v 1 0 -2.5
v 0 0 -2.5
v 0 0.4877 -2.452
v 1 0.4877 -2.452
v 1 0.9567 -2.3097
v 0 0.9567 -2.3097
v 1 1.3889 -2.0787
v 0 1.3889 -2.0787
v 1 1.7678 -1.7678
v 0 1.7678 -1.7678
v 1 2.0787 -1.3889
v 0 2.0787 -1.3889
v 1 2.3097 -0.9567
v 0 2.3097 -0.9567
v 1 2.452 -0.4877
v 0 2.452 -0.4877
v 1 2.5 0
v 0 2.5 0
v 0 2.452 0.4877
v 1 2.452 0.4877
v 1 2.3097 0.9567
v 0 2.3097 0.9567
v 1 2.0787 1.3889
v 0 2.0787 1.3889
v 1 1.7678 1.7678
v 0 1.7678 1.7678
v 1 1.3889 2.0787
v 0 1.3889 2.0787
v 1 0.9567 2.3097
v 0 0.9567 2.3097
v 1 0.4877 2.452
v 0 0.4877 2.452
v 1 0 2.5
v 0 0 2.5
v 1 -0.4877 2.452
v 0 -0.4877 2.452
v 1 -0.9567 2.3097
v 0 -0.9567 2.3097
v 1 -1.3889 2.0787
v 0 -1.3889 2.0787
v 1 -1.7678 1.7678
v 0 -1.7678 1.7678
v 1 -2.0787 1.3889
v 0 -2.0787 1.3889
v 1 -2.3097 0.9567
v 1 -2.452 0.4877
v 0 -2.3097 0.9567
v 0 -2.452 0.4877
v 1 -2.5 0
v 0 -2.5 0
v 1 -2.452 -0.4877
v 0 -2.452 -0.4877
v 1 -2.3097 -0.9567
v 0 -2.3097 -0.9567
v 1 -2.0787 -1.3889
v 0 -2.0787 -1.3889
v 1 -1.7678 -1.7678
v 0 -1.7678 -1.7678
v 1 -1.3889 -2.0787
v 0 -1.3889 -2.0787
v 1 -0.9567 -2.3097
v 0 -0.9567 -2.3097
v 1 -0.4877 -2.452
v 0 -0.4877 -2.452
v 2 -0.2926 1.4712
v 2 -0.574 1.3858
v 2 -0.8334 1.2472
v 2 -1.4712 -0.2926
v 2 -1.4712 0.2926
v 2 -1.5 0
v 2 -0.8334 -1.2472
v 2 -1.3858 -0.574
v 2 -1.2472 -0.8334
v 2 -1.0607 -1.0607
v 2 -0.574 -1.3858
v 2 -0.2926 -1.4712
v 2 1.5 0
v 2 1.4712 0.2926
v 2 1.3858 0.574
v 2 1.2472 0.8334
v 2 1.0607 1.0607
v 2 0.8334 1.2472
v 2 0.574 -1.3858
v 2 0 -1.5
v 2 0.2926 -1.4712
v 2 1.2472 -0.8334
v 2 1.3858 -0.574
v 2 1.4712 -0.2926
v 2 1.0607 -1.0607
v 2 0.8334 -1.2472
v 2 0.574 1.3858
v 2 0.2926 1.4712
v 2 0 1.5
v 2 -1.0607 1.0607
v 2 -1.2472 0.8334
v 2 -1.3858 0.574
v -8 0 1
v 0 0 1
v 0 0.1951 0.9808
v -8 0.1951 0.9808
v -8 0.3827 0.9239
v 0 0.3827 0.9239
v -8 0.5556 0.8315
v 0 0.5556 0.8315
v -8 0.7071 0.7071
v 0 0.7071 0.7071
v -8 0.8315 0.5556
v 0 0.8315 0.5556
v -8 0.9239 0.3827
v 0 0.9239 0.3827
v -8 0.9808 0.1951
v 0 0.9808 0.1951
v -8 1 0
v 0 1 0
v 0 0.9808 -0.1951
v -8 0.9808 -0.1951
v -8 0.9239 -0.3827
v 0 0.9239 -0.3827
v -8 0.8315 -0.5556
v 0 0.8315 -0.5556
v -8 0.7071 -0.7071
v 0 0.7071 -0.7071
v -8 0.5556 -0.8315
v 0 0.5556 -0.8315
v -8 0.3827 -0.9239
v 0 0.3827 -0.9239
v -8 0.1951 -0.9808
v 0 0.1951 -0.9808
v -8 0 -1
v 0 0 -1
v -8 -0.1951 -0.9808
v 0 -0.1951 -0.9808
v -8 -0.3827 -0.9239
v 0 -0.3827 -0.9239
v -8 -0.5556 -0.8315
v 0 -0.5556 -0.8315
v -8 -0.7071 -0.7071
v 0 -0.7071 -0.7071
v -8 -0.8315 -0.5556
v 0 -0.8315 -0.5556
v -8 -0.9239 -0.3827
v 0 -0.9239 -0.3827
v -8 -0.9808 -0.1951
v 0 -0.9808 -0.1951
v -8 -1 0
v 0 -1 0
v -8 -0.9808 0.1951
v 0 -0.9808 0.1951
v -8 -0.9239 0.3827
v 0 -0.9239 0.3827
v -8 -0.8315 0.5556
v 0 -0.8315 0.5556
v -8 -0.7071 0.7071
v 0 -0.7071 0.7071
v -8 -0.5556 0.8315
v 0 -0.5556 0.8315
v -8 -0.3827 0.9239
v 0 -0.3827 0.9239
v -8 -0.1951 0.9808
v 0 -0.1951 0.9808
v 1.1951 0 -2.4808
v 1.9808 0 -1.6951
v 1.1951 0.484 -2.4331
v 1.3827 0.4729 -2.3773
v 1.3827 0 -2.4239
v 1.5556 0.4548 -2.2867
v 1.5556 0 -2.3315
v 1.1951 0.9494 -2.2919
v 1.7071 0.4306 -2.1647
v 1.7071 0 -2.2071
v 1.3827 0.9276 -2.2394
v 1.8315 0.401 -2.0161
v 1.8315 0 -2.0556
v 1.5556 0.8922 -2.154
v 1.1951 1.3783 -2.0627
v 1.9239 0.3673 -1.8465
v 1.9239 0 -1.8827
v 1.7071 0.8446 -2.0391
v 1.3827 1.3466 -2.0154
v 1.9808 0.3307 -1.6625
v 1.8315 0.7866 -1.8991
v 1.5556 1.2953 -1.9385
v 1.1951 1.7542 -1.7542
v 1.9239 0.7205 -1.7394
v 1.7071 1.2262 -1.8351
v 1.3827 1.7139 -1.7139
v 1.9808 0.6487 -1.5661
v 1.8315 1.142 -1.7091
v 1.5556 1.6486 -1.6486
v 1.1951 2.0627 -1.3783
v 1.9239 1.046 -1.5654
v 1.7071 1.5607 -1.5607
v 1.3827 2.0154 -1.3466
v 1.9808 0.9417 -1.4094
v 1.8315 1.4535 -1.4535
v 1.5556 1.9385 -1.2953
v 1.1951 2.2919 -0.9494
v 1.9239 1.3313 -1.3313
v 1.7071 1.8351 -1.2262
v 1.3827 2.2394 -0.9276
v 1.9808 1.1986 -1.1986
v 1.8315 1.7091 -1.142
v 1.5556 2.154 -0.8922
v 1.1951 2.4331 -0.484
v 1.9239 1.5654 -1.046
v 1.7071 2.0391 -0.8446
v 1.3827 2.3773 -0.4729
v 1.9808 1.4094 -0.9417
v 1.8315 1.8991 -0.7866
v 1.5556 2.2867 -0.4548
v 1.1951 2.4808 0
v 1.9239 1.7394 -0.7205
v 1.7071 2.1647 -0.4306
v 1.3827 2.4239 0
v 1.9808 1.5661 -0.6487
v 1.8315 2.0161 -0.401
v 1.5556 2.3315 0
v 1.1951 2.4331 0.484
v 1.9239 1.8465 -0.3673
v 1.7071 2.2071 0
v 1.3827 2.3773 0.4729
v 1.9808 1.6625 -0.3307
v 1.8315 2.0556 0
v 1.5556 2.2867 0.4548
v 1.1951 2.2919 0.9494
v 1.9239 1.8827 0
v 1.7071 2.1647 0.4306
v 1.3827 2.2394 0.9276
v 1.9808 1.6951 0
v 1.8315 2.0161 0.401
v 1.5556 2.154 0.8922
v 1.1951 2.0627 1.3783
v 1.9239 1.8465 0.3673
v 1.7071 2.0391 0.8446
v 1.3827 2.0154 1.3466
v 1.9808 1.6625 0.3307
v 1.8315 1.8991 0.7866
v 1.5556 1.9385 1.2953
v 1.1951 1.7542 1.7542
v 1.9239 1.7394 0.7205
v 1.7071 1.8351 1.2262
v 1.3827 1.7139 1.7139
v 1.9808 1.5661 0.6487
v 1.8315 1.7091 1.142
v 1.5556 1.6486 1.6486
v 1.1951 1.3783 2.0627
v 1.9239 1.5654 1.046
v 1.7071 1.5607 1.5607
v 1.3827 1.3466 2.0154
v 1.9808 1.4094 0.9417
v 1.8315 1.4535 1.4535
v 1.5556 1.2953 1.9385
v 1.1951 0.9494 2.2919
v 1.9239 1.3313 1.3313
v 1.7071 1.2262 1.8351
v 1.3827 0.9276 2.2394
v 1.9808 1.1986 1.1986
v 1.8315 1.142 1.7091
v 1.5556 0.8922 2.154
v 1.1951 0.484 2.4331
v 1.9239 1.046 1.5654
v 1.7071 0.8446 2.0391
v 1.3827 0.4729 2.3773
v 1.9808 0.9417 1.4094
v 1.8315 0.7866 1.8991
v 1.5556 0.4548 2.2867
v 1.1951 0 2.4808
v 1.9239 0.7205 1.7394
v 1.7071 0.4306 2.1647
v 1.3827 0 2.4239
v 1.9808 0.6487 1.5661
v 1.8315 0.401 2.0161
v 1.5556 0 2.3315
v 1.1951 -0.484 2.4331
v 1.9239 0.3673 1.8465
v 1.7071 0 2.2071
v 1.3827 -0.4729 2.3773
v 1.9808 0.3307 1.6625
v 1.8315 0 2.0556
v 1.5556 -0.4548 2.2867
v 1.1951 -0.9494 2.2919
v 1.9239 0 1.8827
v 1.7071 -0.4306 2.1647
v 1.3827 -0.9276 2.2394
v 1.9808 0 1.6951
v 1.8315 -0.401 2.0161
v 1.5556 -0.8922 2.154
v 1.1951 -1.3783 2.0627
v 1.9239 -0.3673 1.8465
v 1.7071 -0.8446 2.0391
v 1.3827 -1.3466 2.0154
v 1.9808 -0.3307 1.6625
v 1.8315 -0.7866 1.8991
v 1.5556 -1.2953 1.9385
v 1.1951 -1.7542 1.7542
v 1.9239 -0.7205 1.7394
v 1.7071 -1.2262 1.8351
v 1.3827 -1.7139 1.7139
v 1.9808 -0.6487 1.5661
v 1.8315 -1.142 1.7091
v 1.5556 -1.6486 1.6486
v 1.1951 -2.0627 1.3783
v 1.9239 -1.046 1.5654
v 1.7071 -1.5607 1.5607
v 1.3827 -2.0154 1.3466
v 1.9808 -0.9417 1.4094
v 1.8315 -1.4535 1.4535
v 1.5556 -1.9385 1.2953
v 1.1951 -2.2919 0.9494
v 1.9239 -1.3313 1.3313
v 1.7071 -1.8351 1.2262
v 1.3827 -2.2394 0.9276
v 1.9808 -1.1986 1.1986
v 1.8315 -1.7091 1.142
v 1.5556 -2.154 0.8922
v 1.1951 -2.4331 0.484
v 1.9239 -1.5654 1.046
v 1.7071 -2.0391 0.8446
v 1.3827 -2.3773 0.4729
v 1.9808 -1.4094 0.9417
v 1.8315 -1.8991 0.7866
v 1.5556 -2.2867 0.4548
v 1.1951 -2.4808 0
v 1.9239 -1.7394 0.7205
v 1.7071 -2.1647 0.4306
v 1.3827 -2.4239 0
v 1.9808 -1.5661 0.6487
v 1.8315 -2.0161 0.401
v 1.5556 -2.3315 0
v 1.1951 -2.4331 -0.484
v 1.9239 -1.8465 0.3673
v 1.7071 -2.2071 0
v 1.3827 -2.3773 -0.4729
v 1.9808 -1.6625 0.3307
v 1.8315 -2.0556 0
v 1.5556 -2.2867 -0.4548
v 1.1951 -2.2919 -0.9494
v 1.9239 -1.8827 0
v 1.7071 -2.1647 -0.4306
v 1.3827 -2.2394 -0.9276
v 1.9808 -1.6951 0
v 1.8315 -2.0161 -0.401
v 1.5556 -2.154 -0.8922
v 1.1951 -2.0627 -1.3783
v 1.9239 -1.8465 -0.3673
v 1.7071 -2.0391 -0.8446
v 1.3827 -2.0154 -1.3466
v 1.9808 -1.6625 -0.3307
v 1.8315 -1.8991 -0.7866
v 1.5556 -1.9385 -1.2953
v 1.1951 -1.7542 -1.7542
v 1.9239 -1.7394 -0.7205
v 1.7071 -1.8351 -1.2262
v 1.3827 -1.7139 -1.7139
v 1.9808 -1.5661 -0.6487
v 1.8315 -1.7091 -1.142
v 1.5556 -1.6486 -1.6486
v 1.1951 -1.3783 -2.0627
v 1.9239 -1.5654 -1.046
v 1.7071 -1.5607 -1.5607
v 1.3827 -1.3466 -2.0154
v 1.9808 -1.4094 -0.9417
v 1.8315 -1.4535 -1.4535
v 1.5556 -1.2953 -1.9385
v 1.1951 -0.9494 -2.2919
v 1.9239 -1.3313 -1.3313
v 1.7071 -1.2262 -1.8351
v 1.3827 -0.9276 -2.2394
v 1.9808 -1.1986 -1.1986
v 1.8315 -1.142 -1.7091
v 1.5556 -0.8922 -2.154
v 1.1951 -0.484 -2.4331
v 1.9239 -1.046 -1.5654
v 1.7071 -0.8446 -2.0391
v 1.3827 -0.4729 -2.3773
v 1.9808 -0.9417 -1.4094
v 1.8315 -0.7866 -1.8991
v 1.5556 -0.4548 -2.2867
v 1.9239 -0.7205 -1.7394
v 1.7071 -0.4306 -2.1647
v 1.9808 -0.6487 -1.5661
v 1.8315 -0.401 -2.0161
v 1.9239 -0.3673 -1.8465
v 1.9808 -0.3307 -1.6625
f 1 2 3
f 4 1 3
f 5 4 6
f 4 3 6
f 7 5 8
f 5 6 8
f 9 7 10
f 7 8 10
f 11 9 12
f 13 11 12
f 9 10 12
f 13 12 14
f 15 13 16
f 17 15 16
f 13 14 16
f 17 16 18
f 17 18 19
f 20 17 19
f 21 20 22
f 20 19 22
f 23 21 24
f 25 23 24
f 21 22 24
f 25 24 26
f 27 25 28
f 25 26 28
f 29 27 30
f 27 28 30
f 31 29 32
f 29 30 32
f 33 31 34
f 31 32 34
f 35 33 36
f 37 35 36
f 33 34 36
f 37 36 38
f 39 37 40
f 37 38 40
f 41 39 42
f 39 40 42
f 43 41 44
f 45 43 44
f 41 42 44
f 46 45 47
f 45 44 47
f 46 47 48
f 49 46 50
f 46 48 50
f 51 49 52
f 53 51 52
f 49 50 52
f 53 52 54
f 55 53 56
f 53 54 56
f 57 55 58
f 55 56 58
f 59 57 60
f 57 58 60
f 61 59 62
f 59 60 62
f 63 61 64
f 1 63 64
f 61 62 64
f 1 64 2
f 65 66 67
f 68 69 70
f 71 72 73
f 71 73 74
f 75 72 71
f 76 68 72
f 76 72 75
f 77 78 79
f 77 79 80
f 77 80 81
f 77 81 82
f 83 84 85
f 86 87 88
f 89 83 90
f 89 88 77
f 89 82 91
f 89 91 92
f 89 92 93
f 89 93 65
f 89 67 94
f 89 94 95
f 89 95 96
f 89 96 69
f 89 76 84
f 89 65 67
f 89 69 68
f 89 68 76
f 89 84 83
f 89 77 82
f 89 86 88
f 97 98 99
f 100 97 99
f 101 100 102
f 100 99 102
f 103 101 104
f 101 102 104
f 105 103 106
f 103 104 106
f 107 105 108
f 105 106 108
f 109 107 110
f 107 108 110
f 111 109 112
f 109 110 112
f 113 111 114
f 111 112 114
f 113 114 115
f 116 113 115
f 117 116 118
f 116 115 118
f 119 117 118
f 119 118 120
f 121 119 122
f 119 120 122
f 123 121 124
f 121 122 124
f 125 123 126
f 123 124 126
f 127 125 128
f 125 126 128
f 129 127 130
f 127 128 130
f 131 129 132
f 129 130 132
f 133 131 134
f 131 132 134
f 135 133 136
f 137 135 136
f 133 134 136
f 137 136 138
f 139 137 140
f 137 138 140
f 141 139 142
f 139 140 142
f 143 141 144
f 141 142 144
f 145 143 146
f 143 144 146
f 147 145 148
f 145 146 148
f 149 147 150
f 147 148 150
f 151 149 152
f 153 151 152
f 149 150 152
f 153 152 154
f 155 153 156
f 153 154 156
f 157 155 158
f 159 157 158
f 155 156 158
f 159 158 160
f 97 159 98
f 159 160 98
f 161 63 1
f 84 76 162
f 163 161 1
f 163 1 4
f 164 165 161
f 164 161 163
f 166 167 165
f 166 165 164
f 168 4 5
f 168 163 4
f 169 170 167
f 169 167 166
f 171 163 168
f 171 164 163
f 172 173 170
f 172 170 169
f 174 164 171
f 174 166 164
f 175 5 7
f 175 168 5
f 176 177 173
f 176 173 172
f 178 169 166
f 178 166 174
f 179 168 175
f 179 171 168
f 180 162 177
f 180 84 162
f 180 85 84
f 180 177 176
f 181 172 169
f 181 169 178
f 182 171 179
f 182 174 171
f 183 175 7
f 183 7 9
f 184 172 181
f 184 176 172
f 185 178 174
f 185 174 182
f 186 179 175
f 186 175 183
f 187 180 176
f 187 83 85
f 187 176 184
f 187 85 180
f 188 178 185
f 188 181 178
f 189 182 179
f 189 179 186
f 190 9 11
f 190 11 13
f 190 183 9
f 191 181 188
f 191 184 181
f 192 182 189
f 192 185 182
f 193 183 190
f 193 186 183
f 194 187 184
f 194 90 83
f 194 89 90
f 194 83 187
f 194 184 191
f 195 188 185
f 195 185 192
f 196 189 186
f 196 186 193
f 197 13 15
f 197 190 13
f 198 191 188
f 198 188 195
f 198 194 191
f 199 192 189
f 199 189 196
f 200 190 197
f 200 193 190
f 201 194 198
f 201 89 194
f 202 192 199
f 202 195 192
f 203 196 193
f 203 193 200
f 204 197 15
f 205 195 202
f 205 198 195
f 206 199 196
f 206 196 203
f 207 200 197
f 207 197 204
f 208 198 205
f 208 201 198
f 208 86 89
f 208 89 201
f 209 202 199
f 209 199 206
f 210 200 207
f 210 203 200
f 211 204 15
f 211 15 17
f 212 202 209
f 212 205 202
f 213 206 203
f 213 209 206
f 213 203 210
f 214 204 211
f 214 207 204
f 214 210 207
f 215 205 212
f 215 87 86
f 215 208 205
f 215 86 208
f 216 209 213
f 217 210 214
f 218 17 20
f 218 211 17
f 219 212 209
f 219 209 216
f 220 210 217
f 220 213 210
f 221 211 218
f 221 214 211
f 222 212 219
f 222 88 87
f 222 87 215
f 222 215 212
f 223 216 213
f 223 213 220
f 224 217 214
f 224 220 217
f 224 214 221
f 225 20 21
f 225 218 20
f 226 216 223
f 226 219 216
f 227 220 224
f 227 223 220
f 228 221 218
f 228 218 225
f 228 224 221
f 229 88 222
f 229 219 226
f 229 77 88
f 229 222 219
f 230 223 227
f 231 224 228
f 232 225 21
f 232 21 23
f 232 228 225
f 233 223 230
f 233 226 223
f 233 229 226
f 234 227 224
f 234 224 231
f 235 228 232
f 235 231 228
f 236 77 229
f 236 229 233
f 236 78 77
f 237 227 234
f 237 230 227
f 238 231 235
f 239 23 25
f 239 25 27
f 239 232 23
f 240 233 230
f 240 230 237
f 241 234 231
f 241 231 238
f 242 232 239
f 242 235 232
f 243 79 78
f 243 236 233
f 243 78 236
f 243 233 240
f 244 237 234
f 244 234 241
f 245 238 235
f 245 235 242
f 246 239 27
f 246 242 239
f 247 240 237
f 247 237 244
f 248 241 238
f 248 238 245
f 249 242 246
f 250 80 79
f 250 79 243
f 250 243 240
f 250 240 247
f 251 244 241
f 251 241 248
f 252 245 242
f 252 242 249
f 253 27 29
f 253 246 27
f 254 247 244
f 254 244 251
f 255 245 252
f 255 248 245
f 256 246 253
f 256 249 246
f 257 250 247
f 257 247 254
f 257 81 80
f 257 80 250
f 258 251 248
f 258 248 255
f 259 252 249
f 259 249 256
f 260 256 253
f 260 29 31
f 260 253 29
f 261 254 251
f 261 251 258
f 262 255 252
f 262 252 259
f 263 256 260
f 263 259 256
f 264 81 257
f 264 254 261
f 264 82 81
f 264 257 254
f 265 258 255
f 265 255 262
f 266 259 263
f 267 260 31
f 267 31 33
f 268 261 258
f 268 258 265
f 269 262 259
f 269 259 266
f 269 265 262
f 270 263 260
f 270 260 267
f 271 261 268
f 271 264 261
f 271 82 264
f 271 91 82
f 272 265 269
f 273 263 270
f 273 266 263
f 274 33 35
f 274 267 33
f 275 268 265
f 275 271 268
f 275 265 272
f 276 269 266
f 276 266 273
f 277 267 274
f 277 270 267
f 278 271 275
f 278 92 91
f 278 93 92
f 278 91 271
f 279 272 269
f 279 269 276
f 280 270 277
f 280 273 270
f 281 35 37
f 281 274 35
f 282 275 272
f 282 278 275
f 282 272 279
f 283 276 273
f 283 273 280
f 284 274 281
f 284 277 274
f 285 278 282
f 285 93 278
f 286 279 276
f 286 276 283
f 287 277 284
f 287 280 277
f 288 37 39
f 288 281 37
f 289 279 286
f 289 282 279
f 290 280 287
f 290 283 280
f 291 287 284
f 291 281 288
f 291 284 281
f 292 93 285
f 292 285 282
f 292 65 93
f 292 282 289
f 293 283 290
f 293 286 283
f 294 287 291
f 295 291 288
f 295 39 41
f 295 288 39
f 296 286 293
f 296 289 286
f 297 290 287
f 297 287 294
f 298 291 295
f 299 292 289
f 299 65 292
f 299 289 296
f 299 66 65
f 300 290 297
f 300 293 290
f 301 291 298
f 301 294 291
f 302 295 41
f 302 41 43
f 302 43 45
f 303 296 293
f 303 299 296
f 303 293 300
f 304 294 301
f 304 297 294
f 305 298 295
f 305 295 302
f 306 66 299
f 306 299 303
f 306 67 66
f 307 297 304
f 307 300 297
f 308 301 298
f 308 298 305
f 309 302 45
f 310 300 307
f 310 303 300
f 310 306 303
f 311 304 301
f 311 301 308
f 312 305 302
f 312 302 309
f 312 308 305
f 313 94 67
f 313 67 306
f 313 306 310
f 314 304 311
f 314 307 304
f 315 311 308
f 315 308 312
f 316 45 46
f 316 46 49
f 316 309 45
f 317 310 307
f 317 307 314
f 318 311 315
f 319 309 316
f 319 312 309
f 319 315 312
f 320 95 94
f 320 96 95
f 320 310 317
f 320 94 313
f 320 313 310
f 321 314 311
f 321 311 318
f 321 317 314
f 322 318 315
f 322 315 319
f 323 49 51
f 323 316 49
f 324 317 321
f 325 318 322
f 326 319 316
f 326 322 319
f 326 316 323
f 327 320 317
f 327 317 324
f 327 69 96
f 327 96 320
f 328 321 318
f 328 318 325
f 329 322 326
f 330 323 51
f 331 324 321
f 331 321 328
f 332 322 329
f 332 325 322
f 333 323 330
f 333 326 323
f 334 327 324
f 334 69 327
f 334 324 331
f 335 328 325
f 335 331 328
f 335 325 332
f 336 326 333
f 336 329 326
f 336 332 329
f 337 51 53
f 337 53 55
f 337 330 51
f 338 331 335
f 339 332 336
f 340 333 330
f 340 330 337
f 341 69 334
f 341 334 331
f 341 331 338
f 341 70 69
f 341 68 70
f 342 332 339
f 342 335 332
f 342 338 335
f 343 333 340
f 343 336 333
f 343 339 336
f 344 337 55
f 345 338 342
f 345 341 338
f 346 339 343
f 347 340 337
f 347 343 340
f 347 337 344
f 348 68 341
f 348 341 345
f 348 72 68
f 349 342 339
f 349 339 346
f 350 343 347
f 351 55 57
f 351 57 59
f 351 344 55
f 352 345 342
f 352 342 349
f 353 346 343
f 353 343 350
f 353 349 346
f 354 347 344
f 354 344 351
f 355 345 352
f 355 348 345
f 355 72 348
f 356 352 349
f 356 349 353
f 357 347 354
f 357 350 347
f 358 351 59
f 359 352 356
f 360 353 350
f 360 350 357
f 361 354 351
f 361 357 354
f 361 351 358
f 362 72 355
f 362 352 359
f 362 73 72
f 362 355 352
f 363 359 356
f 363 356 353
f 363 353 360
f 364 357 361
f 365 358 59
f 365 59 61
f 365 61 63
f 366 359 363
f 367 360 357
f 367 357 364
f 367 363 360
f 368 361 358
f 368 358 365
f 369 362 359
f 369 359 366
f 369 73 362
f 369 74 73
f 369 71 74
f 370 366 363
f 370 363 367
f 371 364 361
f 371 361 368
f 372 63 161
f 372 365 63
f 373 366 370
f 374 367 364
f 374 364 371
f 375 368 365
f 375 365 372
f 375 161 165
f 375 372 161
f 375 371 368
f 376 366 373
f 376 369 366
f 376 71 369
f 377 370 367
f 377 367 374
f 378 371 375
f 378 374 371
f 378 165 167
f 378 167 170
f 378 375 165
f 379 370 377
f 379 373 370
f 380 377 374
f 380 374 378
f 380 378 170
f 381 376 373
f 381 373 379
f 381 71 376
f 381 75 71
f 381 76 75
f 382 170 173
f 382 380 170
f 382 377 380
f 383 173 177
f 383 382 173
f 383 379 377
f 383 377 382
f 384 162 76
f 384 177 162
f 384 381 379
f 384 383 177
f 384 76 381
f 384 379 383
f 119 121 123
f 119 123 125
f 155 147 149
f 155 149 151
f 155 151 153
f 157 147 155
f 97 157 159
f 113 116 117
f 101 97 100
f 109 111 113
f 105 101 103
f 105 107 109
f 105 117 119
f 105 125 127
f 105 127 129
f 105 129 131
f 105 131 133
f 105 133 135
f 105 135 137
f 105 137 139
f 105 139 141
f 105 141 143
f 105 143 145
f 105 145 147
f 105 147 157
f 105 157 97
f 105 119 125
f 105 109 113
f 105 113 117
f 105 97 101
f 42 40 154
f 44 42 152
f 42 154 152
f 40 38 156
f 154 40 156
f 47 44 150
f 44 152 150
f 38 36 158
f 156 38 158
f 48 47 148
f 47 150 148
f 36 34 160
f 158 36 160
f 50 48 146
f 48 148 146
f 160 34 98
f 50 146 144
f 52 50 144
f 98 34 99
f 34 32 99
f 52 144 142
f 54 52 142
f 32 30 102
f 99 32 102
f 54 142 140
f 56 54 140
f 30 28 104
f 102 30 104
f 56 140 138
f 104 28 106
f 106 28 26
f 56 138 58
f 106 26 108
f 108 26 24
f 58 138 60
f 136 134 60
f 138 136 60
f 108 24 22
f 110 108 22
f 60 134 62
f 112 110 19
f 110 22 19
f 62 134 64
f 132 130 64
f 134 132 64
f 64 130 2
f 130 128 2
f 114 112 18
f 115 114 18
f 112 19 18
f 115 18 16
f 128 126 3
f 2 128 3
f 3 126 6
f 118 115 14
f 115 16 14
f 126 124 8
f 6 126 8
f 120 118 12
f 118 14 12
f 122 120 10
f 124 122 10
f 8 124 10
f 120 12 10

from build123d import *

# Parameters (mm, degrees)
SKIZZE1_R                       = 2.5
AUFSATZ_LINEAR_AUSTRAGEN1_DEPTH = 2
SKIZZE2_R                       = 1
AUFSATZ_LINEAR_AUSTRAGEN2_DEPTH = 8
VERRUNDUNG1_R                   = 1


with BuildPart() as part:
    # Skizze1 → Aufsatz-Linear austragen1 (new body)
    with BuildSketch(Plane(origin=(0, 0, 0), x_dir=(0, 0, -1), z_dir=(1, 0, 0))):
        Circle(SKIZZE1_R)
    extrude(amount=AUFSATZ_LINEAR_AUSTRAGEN1_DEPTH)

    # Skizze2 → Aufsatz-Linear austragen2 (add)
    with BuildSketch(Plane.ZY):
        Circle(SKIZZE2_R)
    extrude(amount=AUFSATZ_LINEAR_AUSTRAGEN2_DEPTH)

    # Verrundung1
    verrundung1_edges = [part.edges().sort_by_distance(p)[0] for p in [
        (2, 0, 2.5),
    ]]
    fillet(verrundung1_edges, radius=VERRUNDUNG1_R)


solid = part.part
